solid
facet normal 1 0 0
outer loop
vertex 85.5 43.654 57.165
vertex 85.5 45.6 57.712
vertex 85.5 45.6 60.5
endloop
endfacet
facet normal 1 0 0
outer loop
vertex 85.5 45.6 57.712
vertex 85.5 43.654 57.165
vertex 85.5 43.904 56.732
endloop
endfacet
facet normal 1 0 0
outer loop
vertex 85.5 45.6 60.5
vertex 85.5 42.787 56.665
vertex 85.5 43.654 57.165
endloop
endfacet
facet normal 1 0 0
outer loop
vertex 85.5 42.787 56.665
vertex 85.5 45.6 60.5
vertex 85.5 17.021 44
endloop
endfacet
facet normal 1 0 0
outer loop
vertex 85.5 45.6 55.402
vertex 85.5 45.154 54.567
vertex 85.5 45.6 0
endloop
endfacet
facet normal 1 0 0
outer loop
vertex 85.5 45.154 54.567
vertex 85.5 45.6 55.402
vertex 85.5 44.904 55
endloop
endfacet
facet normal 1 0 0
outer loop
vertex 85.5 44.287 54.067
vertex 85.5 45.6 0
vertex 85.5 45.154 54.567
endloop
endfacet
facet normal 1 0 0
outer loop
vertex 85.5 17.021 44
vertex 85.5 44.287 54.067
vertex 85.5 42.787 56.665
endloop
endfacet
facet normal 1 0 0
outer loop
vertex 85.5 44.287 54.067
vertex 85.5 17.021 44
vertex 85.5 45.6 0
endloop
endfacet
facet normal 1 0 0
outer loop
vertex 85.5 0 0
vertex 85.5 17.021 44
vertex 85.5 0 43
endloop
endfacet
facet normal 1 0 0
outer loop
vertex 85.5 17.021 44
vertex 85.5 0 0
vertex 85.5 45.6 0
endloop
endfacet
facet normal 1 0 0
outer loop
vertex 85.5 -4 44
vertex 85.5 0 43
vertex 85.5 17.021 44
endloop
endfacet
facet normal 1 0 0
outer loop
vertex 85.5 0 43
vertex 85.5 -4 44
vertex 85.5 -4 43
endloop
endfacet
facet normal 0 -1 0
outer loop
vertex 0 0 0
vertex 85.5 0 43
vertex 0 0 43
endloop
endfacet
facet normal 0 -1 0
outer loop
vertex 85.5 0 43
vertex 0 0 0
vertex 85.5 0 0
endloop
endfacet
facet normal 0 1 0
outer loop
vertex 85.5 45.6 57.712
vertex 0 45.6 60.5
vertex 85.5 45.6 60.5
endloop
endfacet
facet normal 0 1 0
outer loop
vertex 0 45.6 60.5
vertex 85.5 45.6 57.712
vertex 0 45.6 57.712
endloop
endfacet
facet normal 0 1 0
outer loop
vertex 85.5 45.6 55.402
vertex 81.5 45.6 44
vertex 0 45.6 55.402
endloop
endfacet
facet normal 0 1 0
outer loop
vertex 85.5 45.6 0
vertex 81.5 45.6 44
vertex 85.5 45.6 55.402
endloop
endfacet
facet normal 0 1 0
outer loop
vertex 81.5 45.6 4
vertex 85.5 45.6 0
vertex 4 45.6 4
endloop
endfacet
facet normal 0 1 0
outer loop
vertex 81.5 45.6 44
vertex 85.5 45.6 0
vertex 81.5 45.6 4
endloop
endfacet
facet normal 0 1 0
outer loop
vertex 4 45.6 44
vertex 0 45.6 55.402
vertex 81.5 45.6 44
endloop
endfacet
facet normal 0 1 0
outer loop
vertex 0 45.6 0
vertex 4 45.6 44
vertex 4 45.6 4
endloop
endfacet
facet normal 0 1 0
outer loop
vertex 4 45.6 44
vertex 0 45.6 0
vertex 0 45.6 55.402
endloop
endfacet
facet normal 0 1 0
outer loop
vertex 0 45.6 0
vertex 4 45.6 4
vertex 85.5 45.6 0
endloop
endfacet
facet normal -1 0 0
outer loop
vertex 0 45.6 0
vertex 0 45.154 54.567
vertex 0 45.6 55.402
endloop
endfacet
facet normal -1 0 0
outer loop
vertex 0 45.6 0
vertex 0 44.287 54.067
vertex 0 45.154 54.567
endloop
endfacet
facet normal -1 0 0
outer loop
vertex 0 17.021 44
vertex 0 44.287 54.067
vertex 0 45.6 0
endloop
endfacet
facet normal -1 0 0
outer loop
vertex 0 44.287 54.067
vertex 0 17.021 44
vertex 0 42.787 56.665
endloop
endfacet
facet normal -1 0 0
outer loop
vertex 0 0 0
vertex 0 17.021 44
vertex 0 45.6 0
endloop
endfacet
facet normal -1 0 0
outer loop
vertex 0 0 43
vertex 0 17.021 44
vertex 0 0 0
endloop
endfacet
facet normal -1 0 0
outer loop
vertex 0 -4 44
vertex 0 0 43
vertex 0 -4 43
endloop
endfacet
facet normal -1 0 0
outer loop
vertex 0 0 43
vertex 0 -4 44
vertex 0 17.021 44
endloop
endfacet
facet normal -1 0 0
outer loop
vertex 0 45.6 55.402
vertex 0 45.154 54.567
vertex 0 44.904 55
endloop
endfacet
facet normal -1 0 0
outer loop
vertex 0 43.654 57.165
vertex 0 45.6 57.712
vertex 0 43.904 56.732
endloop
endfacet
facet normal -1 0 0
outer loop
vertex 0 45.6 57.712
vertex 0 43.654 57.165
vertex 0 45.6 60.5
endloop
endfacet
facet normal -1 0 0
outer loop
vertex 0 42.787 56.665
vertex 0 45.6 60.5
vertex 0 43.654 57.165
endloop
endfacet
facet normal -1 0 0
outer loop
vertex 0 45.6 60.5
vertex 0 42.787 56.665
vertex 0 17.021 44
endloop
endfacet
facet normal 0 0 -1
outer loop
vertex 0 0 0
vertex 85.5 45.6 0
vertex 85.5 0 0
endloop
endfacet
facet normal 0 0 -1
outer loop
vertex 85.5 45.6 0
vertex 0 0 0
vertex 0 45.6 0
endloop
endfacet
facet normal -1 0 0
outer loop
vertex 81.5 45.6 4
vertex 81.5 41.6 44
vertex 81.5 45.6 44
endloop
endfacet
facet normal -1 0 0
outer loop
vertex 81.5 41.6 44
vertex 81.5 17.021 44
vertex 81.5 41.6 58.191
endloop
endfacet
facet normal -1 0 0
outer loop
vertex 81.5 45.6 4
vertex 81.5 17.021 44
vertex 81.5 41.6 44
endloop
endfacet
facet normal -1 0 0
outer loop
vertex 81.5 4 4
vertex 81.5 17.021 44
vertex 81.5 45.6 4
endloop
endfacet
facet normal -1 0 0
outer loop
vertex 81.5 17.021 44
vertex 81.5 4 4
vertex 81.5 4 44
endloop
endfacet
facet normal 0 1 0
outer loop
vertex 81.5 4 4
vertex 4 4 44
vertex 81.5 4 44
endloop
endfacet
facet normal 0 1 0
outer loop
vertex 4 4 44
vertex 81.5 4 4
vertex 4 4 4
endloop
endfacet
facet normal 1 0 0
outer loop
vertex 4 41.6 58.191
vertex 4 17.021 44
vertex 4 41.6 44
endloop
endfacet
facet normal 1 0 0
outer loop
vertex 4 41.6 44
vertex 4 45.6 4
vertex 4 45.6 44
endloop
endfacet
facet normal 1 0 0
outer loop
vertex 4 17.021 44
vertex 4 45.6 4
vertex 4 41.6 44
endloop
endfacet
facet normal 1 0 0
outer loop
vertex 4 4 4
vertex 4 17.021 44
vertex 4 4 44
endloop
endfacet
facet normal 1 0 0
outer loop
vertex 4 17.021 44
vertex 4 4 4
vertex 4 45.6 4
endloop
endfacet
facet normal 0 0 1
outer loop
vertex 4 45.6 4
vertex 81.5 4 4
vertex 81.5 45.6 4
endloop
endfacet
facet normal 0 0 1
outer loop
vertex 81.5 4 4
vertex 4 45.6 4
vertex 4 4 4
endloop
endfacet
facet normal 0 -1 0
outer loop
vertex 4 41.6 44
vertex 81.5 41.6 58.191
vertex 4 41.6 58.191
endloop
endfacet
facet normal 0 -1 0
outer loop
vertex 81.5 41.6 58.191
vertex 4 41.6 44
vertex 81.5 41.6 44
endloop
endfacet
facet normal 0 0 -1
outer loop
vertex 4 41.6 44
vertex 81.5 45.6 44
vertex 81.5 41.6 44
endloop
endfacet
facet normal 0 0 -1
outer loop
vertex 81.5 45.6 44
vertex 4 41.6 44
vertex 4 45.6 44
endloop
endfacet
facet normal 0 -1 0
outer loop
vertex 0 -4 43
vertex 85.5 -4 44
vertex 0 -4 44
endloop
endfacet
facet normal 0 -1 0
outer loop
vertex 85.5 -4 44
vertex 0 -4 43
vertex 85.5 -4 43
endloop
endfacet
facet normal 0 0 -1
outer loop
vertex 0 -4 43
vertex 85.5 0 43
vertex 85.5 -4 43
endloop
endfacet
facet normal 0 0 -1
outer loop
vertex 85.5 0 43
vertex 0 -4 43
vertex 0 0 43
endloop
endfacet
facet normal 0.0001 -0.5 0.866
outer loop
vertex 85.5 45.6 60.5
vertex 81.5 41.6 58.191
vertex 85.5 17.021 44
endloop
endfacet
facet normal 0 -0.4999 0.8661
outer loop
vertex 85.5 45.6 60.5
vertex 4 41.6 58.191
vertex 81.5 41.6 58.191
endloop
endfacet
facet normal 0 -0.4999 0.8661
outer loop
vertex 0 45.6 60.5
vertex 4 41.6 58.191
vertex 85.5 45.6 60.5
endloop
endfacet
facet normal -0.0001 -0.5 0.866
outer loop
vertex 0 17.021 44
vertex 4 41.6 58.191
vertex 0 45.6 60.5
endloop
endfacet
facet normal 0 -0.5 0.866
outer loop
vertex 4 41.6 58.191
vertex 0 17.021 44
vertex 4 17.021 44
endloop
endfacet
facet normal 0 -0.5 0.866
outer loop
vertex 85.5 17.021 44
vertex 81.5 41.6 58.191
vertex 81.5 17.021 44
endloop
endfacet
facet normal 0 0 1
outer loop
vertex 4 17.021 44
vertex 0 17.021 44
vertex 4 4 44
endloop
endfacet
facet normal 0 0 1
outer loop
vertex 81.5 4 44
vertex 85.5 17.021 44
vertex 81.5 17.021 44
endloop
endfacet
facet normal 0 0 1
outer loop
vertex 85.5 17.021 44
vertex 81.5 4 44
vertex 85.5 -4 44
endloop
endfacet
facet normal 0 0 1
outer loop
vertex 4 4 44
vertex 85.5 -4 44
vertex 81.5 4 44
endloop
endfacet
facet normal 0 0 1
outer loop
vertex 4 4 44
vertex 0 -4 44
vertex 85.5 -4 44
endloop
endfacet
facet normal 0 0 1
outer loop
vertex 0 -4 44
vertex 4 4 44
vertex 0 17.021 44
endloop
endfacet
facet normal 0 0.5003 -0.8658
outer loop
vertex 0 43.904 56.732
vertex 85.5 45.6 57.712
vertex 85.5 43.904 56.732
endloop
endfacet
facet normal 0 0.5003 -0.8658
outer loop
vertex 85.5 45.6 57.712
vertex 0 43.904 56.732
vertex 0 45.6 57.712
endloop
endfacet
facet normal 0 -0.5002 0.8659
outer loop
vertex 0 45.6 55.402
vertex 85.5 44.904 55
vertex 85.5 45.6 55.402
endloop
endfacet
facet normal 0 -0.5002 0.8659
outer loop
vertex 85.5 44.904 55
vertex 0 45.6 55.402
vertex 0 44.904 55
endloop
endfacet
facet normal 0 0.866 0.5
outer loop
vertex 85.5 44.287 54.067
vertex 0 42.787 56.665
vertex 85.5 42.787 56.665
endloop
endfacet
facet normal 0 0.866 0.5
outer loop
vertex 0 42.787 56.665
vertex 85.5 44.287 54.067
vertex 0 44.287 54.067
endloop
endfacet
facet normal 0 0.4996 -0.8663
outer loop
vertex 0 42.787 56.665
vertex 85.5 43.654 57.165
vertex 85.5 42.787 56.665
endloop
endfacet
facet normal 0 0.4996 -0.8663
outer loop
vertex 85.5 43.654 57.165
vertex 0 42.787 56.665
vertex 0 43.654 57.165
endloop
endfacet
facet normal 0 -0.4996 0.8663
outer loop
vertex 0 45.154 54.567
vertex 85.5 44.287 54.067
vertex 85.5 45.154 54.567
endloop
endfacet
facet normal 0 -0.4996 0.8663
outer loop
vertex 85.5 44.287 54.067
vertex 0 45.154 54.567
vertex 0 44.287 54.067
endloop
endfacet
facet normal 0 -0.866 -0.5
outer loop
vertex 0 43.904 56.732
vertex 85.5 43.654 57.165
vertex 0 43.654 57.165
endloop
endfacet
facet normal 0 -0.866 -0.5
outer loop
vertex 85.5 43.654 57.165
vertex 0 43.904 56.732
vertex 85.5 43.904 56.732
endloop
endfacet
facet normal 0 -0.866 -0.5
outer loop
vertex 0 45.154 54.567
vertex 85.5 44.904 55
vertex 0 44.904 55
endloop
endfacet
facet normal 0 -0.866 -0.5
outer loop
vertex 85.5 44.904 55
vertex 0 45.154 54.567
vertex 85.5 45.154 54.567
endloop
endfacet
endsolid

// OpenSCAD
// Print the shield part with any hard material (e.g. Tough PLA)
// Print the addon clip with TPU

// ------------ Recess measurements -------------
width = 90 * 0.95; // shield width
upperLowerDistance = 54; // length of direct path from upper edge to lower edge 
height = 48 * 0.95; // vertical distance from upper edge to lower edge
edgeWidthTopSide = 5; // width of the edge (sides and top)
edgeWidthBottom = 12.5; // width of the edge (bottom)
safeBendDistance = 40; // the minimum distance from the metal before the cables can be shielded
angle = 60; // the angle at which the angled part bends
angledPartLength = 33; // the length of the angled part

// --------------- Shield settings ---------------
wallThickness = 4; // thickness of the shield walls
depth = cos(angle) * angledPartLength; // the horizontal distance from upper edge to lower edge
scaleX = (width - wallThickness*2) / width; // the scaling factor in x-direction
scaleY = (safeBendDistance + depth - wallThickness) / (safeBendDistance +  depth); // the scaling factor in y-direction
scaleZ = (height - wallThickness) / height; // the scaling factor in z-direction
lipOffset = 4; // the added length that potrudes behind the edges
lipThickness = 2; // the thinkness of the lips

// -------------- Print settings -----------------

print = true;
printBottomLip = false;

module shield() {
  
  color("#202020") {

    difference() {

      union() {

        difference() {
          shieldOuter();

          translate([wallThickness, wallThickness, 0])
            scale([scaleX, scaleY, scaleZ])
              shieldOuter();
        }

        shieldBottom();

        translate([0, safeBendDistance + lipThickness * 1.5, height])
          topLip();
      
      }

      translate([0, lipOffset, 0]) {

        translate([0, safeBendDistance, sin(angle) * angledPartLength])
          rotate([-angle, 0, 0])
            cube([width, angledPartLength, height]);
        
        translate([0, safeBendDistance, sin(angle) * angledPartLength])
          cube([width, angledPartLength, height]);
        
      }

      bottomLipRail();

      
    }
    
  }
  
}

module shieldOuter() {

  cube([width, safeBendDistance + depth + lipOffset, height], center=false);
  
}

module shieldBottom() {

  translate([0, safeBendDistance + lipOffset, 0])
    cube([width, depth, wallThickness]);
  
}

module bottomLipRail() {

  scale([2, 1, 1])
    translate([-width*0.25, safeBendDistance + depth - lipOffset/2, cos(angle) * edgeWidthBottom/4])
      rotate([-angle, 0, 0])
        bottomLip();
  
}

module bottomLip() {

  union() {
    cube([width, edgeWidthBottom/2, lipThickness]);
    translate([0, 0, -lipThickness*0.25])
      cube([width, lipOffset/4, lipThickness*1.5]);
  }
  
}

module topLip() {

  cube([width, lipThickness, lipOffset]);
  
}


if (print) {

  if (printBottomLip) {

    translate([0, lipThickness * 1.5, 0])
      rotate([90, 0, 0])
        bottomLip();
    
  } else {

    translate([0, height, 0])
      rotate([90, 0, 0])
        shield();

  }

} else {

  shield();

}
